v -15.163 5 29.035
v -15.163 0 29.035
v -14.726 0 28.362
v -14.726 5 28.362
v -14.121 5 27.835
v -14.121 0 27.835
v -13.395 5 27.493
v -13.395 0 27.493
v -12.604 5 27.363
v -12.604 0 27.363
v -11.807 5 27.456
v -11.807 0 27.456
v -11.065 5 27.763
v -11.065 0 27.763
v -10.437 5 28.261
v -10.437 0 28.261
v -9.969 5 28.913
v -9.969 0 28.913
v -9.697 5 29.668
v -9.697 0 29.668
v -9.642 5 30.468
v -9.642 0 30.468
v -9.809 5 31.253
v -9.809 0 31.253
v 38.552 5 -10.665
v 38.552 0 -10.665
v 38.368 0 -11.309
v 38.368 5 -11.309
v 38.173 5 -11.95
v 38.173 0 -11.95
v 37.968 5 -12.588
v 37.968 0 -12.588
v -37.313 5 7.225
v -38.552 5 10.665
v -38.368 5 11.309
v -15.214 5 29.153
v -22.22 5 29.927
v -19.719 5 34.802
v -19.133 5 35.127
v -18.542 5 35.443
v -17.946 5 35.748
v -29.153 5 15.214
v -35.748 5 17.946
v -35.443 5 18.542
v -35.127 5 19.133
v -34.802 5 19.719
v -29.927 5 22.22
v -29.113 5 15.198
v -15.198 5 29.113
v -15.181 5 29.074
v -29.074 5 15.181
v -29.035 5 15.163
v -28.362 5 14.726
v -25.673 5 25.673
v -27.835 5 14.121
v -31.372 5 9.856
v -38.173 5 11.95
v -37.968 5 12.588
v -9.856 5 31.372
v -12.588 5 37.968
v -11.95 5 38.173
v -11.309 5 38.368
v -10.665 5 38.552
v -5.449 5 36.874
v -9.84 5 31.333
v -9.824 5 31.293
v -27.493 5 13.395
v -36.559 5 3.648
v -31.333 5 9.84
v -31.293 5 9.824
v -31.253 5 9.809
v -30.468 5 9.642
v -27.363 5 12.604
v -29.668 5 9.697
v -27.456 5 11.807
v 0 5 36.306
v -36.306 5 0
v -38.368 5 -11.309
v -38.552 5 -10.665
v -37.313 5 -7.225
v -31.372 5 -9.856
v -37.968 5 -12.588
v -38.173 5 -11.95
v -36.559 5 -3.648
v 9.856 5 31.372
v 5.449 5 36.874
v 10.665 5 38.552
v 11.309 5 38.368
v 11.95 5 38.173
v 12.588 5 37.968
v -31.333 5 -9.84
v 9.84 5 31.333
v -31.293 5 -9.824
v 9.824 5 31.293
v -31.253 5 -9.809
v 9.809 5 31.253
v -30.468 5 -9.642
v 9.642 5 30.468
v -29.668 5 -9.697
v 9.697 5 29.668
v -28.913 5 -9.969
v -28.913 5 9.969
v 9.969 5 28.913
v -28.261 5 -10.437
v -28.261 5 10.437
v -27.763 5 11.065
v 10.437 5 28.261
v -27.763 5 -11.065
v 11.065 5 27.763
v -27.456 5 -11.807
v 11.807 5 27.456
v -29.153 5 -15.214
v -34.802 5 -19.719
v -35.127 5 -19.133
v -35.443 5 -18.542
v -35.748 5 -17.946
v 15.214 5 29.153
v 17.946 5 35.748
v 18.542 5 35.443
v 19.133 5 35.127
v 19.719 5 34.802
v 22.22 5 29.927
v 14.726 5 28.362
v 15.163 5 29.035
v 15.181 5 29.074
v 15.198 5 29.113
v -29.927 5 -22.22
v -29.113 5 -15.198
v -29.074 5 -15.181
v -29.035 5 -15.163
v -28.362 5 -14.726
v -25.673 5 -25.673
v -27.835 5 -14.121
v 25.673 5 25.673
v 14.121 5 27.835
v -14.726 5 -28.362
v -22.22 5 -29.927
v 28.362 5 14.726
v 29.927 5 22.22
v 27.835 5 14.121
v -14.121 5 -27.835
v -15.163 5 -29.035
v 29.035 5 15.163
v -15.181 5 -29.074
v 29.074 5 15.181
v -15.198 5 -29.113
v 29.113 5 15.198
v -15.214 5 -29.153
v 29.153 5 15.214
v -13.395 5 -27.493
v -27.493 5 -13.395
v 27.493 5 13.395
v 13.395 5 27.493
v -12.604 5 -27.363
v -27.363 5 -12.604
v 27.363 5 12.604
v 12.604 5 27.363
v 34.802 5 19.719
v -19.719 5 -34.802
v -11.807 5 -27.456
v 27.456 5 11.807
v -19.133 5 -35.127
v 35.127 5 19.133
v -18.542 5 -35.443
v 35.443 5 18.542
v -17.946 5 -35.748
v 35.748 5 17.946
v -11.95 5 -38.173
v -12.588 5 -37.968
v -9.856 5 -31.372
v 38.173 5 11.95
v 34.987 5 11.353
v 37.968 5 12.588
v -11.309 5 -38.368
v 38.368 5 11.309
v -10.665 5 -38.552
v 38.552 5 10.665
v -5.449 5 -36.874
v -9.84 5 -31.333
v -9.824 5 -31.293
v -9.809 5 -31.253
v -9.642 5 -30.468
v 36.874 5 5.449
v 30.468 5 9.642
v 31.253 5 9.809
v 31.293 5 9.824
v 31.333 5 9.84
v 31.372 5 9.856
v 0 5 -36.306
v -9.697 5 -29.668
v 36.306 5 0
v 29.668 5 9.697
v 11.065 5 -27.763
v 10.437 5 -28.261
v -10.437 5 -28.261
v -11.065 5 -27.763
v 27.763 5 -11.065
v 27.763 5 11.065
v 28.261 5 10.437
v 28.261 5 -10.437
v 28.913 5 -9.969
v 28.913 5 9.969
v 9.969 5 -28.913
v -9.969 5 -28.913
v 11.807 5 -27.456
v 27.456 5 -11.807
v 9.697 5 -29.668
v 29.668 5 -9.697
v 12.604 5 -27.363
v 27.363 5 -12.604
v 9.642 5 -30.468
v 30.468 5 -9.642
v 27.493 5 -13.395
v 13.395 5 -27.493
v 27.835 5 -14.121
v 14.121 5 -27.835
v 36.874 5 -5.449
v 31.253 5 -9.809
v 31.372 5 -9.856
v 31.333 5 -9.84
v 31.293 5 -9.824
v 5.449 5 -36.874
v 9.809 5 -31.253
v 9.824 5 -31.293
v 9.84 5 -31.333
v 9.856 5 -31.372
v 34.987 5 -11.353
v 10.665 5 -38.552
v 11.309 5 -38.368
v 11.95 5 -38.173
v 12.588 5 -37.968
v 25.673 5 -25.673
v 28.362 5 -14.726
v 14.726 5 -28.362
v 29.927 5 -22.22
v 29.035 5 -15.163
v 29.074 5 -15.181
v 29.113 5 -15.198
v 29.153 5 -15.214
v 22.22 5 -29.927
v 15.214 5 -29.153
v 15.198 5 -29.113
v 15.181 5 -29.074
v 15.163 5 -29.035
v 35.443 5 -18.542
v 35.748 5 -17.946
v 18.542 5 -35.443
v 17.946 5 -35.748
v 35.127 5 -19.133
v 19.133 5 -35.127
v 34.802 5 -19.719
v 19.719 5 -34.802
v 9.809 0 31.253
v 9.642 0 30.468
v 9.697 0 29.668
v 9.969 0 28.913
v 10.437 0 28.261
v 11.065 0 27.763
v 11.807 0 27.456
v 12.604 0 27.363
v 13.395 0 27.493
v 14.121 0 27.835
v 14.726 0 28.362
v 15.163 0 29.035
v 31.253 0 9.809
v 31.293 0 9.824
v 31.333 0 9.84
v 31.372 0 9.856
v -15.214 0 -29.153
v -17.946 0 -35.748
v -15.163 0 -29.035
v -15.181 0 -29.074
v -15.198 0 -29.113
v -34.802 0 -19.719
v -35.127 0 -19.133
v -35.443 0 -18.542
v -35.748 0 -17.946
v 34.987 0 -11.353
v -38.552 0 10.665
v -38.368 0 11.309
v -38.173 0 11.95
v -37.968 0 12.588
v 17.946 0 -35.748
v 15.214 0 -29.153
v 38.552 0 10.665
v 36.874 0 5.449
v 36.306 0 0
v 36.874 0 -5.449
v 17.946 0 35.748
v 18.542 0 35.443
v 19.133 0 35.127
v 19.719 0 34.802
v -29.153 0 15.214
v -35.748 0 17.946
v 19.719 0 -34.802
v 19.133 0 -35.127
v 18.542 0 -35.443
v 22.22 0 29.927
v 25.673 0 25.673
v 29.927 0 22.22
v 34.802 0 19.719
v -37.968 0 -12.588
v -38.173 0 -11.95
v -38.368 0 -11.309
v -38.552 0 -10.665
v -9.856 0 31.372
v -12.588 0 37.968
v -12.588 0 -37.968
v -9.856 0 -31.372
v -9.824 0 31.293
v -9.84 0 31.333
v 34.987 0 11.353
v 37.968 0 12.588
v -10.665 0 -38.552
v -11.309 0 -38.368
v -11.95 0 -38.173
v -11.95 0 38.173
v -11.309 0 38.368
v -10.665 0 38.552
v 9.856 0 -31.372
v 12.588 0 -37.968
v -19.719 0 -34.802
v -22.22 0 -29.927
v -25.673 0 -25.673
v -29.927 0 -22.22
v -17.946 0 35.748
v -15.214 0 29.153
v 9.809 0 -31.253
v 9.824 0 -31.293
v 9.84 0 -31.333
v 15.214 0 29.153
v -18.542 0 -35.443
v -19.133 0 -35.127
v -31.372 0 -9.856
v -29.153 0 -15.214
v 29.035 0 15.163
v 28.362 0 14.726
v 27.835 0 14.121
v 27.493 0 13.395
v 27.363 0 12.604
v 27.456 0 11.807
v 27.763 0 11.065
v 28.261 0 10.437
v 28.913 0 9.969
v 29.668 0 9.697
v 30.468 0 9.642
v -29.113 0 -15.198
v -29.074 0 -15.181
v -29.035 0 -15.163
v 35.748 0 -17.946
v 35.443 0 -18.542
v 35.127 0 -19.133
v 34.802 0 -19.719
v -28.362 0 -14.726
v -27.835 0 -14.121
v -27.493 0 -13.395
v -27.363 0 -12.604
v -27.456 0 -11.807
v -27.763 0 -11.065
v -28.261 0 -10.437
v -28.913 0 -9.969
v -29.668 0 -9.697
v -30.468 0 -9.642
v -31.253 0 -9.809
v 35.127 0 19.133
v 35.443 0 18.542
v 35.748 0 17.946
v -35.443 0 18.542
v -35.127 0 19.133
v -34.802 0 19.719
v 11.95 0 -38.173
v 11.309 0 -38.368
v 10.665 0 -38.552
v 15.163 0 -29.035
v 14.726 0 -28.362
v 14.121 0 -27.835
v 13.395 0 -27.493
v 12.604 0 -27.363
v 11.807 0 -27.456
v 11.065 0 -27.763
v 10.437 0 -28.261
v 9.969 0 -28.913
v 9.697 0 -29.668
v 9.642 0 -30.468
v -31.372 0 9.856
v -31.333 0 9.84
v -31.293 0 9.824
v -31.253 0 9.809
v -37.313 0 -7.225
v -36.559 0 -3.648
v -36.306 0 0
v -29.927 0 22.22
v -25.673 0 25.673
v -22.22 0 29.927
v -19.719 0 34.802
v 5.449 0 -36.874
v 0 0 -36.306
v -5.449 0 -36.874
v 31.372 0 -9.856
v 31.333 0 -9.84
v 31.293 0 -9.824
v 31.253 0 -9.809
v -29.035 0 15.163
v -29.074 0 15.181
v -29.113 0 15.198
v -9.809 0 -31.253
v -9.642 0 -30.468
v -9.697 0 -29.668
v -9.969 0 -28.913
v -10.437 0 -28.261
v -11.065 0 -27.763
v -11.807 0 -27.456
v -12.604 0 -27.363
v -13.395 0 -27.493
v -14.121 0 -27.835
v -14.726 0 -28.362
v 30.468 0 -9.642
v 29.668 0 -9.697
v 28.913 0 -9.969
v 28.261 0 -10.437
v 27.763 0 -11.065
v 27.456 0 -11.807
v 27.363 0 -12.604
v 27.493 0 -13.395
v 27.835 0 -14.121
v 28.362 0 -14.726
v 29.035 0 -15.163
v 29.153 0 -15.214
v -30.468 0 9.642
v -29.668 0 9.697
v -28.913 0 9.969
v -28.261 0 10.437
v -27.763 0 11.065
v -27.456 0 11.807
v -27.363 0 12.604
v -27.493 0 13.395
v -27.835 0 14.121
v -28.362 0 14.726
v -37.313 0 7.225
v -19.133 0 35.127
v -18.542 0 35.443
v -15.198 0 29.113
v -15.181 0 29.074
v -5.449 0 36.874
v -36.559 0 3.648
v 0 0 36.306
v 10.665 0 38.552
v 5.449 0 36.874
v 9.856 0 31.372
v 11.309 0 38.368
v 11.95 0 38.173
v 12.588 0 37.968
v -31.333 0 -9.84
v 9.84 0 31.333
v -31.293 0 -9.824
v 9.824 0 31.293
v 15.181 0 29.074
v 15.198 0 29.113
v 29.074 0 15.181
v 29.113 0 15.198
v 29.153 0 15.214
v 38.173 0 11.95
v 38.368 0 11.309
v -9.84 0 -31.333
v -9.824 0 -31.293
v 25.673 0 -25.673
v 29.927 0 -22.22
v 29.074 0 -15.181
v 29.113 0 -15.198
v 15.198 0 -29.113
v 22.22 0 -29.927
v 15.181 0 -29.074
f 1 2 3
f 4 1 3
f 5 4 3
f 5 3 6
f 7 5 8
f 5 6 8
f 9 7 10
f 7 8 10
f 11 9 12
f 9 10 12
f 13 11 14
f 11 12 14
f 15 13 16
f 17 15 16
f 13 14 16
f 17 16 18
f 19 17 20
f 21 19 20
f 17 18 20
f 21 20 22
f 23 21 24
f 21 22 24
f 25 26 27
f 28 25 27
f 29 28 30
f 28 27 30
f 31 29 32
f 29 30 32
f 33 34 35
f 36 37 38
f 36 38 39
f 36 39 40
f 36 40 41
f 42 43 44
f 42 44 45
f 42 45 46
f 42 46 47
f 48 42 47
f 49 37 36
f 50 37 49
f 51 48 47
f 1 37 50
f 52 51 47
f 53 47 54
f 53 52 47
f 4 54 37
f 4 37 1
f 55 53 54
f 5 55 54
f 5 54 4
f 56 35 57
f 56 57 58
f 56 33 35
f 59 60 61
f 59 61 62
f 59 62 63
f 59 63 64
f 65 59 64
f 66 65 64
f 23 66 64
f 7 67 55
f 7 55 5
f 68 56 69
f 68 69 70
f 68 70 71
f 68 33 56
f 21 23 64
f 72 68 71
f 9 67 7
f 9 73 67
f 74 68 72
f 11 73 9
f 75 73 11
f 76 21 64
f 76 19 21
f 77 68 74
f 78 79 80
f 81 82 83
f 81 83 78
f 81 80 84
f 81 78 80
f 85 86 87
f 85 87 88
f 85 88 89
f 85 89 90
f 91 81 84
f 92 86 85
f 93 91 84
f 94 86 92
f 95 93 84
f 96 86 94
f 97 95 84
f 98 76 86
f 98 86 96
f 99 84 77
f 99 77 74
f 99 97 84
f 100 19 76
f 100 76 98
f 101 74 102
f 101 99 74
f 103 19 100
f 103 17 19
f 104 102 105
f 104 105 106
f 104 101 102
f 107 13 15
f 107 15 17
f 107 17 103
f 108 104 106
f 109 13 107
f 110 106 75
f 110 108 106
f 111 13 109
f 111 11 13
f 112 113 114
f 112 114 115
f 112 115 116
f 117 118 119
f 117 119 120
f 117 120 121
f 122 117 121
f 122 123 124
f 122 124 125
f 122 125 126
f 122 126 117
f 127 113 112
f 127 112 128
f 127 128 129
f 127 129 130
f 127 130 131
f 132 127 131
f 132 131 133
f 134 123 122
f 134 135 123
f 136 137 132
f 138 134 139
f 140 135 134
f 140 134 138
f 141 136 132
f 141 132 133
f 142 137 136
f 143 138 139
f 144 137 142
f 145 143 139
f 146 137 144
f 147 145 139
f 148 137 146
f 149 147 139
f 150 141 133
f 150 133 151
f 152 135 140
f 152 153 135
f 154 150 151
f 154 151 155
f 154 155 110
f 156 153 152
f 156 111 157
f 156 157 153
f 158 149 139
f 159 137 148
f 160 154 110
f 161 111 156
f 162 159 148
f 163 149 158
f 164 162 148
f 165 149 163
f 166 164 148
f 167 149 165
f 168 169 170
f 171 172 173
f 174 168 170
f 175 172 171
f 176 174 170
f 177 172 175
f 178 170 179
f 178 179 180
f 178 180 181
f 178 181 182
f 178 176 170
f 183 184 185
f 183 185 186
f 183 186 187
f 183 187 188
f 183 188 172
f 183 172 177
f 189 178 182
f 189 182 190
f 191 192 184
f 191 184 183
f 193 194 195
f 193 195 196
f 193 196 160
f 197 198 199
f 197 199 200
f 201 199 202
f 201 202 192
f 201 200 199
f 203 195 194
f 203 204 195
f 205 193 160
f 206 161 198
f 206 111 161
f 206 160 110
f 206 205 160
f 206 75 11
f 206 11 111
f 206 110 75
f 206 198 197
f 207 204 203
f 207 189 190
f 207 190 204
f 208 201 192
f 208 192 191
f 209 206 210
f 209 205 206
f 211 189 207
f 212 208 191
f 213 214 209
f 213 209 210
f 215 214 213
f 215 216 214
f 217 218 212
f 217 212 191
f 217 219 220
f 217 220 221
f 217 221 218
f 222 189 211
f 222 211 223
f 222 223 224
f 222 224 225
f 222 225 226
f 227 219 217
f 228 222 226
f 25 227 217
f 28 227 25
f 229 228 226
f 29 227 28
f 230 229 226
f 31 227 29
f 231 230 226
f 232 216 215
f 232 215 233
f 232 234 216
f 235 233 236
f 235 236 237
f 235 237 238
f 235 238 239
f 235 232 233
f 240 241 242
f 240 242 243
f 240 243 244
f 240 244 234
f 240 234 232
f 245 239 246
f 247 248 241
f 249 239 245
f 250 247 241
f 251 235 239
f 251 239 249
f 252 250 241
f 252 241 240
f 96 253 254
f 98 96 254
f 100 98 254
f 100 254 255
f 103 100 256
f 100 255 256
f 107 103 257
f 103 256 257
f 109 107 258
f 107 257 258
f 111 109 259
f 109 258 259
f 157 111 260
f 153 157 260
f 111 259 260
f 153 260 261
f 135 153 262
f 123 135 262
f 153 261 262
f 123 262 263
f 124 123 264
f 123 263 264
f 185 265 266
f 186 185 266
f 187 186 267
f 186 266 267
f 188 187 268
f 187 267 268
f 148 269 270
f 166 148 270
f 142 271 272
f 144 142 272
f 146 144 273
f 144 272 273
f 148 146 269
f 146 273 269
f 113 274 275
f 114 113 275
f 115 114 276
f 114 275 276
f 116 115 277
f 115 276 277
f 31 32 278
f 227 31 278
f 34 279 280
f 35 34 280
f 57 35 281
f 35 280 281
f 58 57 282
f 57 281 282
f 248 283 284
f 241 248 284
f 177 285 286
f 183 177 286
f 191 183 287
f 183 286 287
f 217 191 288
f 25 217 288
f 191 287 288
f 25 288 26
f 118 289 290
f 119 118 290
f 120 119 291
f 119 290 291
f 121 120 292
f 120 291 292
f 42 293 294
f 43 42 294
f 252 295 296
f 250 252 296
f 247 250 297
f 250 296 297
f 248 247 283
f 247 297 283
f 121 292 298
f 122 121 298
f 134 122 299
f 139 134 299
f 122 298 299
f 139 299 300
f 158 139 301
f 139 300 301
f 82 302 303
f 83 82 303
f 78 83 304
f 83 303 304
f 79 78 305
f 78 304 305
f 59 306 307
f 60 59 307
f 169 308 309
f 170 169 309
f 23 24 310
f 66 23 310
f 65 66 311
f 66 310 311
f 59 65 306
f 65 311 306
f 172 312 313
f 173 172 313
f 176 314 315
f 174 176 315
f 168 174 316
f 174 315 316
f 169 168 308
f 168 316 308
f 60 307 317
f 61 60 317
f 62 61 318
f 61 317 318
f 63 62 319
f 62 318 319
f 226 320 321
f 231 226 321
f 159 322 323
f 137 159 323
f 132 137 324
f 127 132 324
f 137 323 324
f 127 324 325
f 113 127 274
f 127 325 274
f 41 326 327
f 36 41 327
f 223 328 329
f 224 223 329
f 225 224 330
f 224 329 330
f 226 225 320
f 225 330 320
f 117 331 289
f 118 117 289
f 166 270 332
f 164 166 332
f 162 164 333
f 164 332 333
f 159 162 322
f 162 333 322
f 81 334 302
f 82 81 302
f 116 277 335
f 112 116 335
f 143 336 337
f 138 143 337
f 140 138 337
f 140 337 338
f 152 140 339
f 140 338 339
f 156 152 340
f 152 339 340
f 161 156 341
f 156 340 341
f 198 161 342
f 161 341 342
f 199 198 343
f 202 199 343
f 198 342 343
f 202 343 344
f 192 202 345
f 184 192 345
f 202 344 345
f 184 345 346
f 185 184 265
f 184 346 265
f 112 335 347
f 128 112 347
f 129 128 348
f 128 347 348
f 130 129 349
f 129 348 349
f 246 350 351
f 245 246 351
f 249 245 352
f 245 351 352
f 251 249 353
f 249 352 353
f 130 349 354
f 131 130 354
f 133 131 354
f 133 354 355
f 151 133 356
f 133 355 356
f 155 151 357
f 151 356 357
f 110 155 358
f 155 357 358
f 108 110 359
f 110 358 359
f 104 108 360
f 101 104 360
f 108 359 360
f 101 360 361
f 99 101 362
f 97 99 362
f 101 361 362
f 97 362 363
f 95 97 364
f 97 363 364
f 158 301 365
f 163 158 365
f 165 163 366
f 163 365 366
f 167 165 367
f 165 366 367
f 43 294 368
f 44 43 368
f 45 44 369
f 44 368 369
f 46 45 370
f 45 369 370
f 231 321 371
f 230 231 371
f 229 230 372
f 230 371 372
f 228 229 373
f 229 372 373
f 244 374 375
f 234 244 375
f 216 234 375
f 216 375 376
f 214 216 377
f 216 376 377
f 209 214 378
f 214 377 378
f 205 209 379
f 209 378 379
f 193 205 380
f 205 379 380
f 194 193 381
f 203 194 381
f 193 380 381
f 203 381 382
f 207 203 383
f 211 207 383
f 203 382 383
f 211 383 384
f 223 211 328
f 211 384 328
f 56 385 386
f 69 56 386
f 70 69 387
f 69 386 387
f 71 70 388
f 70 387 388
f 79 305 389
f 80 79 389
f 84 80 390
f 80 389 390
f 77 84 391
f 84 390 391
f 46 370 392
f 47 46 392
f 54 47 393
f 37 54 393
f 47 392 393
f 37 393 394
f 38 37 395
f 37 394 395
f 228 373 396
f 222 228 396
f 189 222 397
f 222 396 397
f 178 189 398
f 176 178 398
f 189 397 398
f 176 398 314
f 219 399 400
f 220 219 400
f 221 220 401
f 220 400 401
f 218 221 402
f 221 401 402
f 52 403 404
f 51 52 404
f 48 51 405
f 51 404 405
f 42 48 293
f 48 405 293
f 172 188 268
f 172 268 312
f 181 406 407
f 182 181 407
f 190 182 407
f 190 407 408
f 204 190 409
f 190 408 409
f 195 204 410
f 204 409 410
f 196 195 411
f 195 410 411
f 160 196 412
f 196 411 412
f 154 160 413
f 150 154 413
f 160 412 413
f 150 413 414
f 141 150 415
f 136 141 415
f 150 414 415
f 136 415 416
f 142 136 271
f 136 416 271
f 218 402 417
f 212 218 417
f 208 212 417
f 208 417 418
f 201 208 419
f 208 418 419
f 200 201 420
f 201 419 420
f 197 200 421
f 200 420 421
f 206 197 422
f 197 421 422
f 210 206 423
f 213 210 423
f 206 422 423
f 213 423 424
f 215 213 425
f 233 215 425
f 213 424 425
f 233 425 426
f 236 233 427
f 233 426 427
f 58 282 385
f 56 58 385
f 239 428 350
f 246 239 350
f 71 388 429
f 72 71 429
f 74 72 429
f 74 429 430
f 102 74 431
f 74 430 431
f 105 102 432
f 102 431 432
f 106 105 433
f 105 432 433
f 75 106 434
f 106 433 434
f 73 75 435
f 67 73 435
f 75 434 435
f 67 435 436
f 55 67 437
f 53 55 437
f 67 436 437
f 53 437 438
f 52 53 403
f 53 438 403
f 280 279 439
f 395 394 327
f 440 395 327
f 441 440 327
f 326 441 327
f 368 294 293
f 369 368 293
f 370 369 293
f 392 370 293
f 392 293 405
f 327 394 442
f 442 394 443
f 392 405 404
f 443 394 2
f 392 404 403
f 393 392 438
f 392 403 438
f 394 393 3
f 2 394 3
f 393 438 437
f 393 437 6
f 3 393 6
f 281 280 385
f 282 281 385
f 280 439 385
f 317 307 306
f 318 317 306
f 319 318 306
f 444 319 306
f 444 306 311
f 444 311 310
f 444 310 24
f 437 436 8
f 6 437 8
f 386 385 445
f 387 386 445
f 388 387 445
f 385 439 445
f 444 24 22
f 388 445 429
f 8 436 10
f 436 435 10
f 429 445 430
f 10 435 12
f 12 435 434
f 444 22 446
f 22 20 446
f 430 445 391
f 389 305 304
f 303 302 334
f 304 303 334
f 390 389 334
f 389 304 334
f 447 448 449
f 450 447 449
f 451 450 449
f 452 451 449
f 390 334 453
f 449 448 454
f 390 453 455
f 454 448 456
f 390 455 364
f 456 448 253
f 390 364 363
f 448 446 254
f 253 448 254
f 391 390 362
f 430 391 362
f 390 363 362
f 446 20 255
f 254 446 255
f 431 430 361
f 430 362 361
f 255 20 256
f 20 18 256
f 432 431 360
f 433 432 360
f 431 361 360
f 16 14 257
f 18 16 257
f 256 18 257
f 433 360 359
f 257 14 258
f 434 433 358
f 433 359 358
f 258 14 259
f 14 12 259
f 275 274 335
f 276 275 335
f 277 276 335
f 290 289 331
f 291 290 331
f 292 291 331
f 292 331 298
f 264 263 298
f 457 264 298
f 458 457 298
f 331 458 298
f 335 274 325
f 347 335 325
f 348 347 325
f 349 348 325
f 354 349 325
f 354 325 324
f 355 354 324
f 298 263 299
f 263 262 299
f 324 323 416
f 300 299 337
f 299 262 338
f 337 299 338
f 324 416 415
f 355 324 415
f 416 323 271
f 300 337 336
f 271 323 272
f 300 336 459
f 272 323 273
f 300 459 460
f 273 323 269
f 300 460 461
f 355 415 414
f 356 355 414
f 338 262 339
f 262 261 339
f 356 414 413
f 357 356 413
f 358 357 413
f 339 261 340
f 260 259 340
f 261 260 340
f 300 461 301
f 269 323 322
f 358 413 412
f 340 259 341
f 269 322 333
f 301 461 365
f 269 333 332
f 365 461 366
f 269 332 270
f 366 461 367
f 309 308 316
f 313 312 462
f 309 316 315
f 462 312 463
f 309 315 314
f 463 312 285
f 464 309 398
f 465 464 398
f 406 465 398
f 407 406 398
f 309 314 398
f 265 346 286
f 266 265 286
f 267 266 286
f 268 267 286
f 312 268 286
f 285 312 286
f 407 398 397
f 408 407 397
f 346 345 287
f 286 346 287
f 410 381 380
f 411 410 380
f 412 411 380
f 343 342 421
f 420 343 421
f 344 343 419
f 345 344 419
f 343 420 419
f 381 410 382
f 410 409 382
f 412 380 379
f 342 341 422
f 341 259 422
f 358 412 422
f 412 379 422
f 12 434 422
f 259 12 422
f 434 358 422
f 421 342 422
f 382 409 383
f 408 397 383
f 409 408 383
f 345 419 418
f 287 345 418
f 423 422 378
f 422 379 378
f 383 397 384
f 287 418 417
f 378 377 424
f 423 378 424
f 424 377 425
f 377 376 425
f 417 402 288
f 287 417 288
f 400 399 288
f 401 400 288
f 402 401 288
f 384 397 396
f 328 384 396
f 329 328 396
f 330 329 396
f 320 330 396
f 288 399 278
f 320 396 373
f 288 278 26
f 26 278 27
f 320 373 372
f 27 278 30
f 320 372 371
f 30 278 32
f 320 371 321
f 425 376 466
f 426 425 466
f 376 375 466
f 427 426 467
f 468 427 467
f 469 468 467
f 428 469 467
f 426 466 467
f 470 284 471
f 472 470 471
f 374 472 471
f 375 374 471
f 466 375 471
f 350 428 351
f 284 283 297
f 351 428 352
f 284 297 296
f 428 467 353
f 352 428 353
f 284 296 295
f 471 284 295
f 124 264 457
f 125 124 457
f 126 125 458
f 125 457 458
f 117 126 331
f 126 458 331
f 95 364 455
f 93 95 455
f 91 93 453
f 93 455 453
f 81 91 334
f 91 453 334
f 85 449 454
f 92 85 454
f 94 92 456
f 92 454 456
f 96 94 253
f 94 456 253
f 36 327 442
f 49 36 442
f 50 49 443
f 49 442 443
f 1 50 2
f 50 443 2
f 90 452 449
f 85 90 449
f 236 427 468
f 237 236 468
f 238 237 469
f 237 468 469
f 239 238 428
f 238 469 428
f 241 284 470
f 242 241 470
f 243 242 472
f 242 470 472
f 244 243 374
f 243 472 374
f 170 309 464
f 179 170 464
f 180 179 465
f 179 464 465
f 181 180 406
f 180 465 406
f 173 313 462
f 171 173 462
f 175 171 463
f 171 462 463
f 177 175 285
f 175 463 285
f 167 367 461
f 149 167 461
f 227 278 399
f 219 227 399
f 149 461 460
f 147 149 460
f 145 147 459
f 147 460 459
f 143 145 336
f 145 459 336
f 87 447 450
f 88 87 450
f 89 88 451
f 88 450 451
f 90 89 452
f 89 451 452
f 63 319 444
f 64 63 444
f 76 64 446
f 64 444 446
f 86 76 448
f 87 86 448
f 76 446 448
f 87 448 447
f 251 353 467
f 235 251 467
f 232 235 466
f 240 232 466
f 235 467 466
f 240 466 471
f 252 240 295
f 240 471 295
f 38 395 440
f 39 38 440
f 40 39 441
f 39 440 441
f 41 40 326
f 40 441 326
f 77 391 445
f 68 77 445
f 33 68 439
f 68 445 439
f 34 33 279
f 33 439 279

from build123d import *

# Parameters (mm, degrees)
BOSS_EXTRUDE1_DEPTH = 5


with BuildPart() as part:
    # Sketch2 → Boss-Extrude1 (new body)
    with BuildSketch(Plane(origin=(0, 0, 0), x_dir=(1, 0, 0), z_dir=(0, 1, 0))):
        with BuildLine():
            ThreePointArc((31.252747625, -9.809451481), (32.378051974, -4.96198779), (32.756061614, 0))
            ThreePointArc((32.756061614, 0), (32.378051974, 4.96198779), (31.252747625, 9.809451481))
            ThreePointArc((31.252747625, 9.809451481), (27.583404246, 11.425420135), (29.035359438, 15.162700114))
            ThreePointArc((29.035359438, 15.162700114), (23.162033292, 23.162033292), (15.162700114, 29.035359438))
            ThreePointArc((15.162700114, 29.035359438), (11.425420135, 27.583404246), (9.809451481, 31.252747625))
            ThreePointArc((9.809451481, 31.252747625), (0, 32.756061614), (-9.809451481, 31.252747625))
            ThreePointArc((-9.809451481, 31.252747625), (-11.425420135, 27.583404246), (-15.162700114, 29.035359438))
            ThreePointArc((-15.162700114, 29.035359438), (-23.162033292, 23.162033292), (-29.035359438, 15.162700114))
            ThreePointArc((-29.035359438, 15.162700114), (-27.583404246, 11.425420135), (-31.252747625, 9.809451481))
            ThreePointArc((-31.252747625, 9.809451481), (-32.756061614, 0), (-31.252747625, -9.809451481))
            ThreePointArc((-31.252747625, -9.809451481), (-27.583404246, -11.425420135), (-29.035359438, -15.162700114))
            ThreePointArc((-29.035359438, -15.162700114), (-23.162033292, -23.162033292), (-15.162700114, -29.035359438))
            ThreePointArc((-15.162700114, -29.035359438), (-11.425420135, -27.583404246), (-9.809451481, -31.252747625))
            ThreePointArc((-9.809451481, -31.252747625), (0, -32.756061614), (9.809451481, -31.252747625))
            ThreePointArc((9.809451481, -31.252747625), (11.425420135, -27.583404246), (15.162700114, -29.035359438))
            ThreePointArc((15.162700114, -29.035359438), (23.162033292, -23.162033292), (29.035359438, -15.162700114))
            ThreePointArc((29.035359438, -15.162700114), (27.583404246, -11.425420135), (31.252747625, -9.809451481))
        make_face()
        with BuildLine():
            Line((9.855951445, 31.372436845), (12.587804051, 37.967712456))
            ThreePointArc((12.587804051, 37.967712456), (11.630092201, 38.271934304), (10.665040579, 38.552002665))
            ThreePointArc((10.665040579, 38.552002665), (0, 36.306495263), (-10.665040579, 38.552002665))
            ThreePointArc((-10.665040579, 38.552002665), (-11.630092201, 38.271934304), (-12.587804051, 37.967712456))
            Line((-12.587804051, 37.967712456), (-9.855951445, 31.372436845))
            ThreePointArc((-9.855951445, 31.372436845), (-9.83203894, 31.312849629), (-9.809451481, 31.252747625))
            ThreePointArc((-9.809451481, 31.252747625), (0, 32.756061614), (9.809451481, 31.252747625))
            ThreePointArc((9.809451481, 31.252747625), (9.83203894, 31.312849629), (9.855951445, 31.372436845))
        make_face()
        with BuildLine():
            ThreePointArc((-17.946305339, 35.748148549), (-18.838627214, 35.286061337), (-19.719059997, 34.801705027))
            ThreePointArc((-19.719059997, 34.801705027), (-25.672569001, 25.672569001), (-34.801705027, 19.719059997))
            ThreePointArc((-34.801705027, 19.719059997), (-35.286061337, 18.838627214), (-35.748148549, 17.946305339))
            Line((-35.748148549, 17.946305339), (-29.152872937, 15.214452733))
            ThreePointArc((-29.152872937, 15.214452733), (-29.093829718, 15.189226904), (-29.035359438, 15.162700114))
            ThreePointArc((-29.035359438, 15.162700114), (-23.162033292, 23.162033292), (-15.162700114, 29.035359438))
            ThreePointArc((-15.162700114, 29.035359438), (-15.189226904, 29.093829718), (-15.214452733, 29.152872937))
            Line((-15.214452733, 29.152872937), (-17.946305339, 35.748148549))
        make_face()
        with BuildLine():
            ThreePointArc((-37.967712456, 12.587804051), (-38.271934304, 11.630092201), (-38.552002665, 10.665040579))
            ThreePointArc((-38.552002665, 10.665040579), (-36.873959465, 5.449435614), (-36.306495263, 0))
            ThreePointArc((-36.306495263, 0), (-36.873959465, -5.449435614), (-38.552002665, -10.665040579))
            ThreePointArc((-38.552002665, -10.665040579), (-38.271934304, -11.630092201), (-37.967712456, -12.587804051))
            Line((-37.967712456, -12.587804051), (-31.372436845, -9.855951445))
            ThreePointArc((-31.372436845, -9.855951445), (-31.312849629, -9.83203894), (-31.252747625, -9.809451481))
            ThreePointArc((-31.252747625, -9.809451481), (-32.756061614, 0), (-31.252747625, 9.809451481))
            ThreePointArc((-31.252747625, 9.809451481), (-31.312849629, 9.83203894), (-31.372436845, 9.855951445))
            Line((-31.372436845, 9.855951445), (-37.967712456, 12.587804051))
        make_face()
        with BuildLine():
            ThreePointArc((-15.214452733, -29.152872937), (-15.189226904, -29.093829718), (-15.162700114, -29.035359438))
            ThreePointArc((-15.162700114, -29.035359438), (-23.162033292, -23.162033292), (-29.035359438, -15.162700114))
            ThreePointArc((-29.035359438, -15.162700114), (-29.093829718, -15.189226904), (-29.152872937, -15.214452733))
            Line((-29.152872937, -15.214452733), (-35.748148549, -17.946305339))
            ThreePointArc((-35.748148549, -17.946305339), (-35.286061337, -18.838627214), (-34.801705027, -19.719059997))
            ThreePointArc((-34.801705027, -19.719059997), (-25.672569001, -25.672569001), (-19.719059997, -34.801705027))
            ThreePointArc((-19.719059997, -34.801705027), (-18.838627214, -35.286061337), (-17.946305339, -35.748148549))
            Line((-17.946305339, -35.748148549), (-15.214452733, -29.152872937))
        make_face()
        with BuildLine():
            ThreePointArc((9.855951445, -31.372436845), (9.83203894, -31.312849629), (9.809451481, -31.252747625))
            ThreePointArc((9.809451481, -31.252747625), (0, -32.756061614), (-9.809451481, -31.252747625))
            ThreePointArc((-9.809451481, -31.252747625), (-9.83203894, -31.312849629), (-9.855951445, -31.372436845))
            Line((-9.855951445, -31.372436845), (-12.587804051, -37.967712456))
            ThreePointArc((-12.587804051, -37.967712456), (-11.630092201, -38.271934304), (-10.665040579, -38.552002665))
            ThreePointArc((-10.665040579, -38.552002665), (0, -36.306495263), (10.665040579, -38.552002665))
            ThreePointArc((10.665040579, -38.552002665), (11.630092201, -38.271934304), (12.587804051, -37.967712456))
            Line((12.587804051, -37.967712456), (9.855951445, -31.372436845))
        make_face()
        with BuildLine():
            ThreePointArc((29.152872937, -15.214452733), (29.093829718, -15.189226904), (29.035359438, -15.162700114))
            ThreePointArc((29.035359438, -15.162700114), (23.162033292, -23.162033292), (15.162700114, -29.035359438))
            ThreePointArc((15.162700114, -29.035359438), (15.189226904, -29.093829718), (15.214452733, -29.152872937))
            Line((15.214452733, -29.152872937), (17.946305339, -35.748148549))
            ThreePointArc((17.946305339, -35.748148549), (18.838627214, -35.286061337), (19.719059997, -34.801705027))
            ThreePointArc((19.719059997, -34.801705027), (25.672569001, -25.672569001), (34.801705027, -19.719059997))
            ThreePointArc((34.801705027, -19.719059997), (35.286061337, -18.838627214), (35.748148549, -17.946305339))
            Line((35.748148549, -17.946305339), (29.152872937, -15.214452733))
        make_face()
        with BuildLine():
            ThreePointArc((34.987322012, -11.353285907), (33.319161403, -5.785231712), (32.756061614, 0))
            ThreePointArc((32.756061614, 0), (32.378051974, -4.96198779), (31.252747625, -9.809451481))
            ThreePointArc((31.252747625, -9.809451481), (31.312849629, -9.83203894), (31.372436845, -9.855951445))
            Line((31.372436845, -9.855951445), (34.987322012, -11.353285907))
        make_face()
        with BuildLine():
            ThreePointArc((38.552002665, 10.665040579), (38.271934304, 11.630092201), (37.967712456, 12.587804051))
            Line((37.967712456, 12.587804051), (34.987322012, 11.353285907))
            ThreePointArc((34.987322012, 11.353285907), (33.319161403, 5.785231712), (32.756061614, 0))
            ThreePointArc((32.756061614, 0), (33.319161403, -5.785231712), (34.987322012, -11.353285907))
            Line((34.987322012, -11.353285907), (37.967712456, -12.587804051))
            ThreePointArc((37.967712456, -12.587804051), (38.271934304, -11.630092201), (38.552002665, -10.665040579))
            ThreePointArc((38.552002665, -10.665040579), (36.306495263, 0), (38.552002665, 10.665040579))
        make_face()
        with BuildLine():
            ThreePointArc((32.756061614, 0), (33.319161403, 5.785231712), (34.987322012, 11.353285907))
            Line((34.987322012, 11.353285907), (31.372436845, 9.855951445))
            ThreePointArc((31.372436845, 9.855951445), (31.312849629, 9.83203894), (31.252747625, 9.809451481))
            ThreePointArc((31.252747625, 9.809451481), (32.378051974, 4.96198779), (32.756061614, 0))
        make_face()
        with BuildLine():
            Line((29.152872937, 15.214452733), (35.748148549, 17.946305339))
            ThreePointArc((35.748148549, 17.946305339), (35.286061337, 18.838627214), (34.801705027, 19.719059997))
            ThreePointArc((34.801705027, 19.719059997), (25.672569001, 25.672569001), (19.719059997, 34.801705027))
            ThreePointArc((19.719059997, 34.801705027), (18.838627214, 35.286061337), (17.946305339, 35.748148549))
            Line((17.946305339, 35.748148549), (15.214452733, 29.152872937))
            ThreePointArc((15.214452733, 29.152872937), (15.189226904, 29.093829718), (15.162700114, 29.035359438))
            ThreePointArc((15.162700114, 29.035359438), (23.162033292, 23.162033292), (29.035359438, 15.162700114))
            ThreePointArc((29.035359438, 15.162700114), (29.093829718, 15.189226904), (29.152872937, 15.214452733))
        make_face()
    extrude(amount=BOSS_EXTRUDE1_DEPTH)


solid = part.part
